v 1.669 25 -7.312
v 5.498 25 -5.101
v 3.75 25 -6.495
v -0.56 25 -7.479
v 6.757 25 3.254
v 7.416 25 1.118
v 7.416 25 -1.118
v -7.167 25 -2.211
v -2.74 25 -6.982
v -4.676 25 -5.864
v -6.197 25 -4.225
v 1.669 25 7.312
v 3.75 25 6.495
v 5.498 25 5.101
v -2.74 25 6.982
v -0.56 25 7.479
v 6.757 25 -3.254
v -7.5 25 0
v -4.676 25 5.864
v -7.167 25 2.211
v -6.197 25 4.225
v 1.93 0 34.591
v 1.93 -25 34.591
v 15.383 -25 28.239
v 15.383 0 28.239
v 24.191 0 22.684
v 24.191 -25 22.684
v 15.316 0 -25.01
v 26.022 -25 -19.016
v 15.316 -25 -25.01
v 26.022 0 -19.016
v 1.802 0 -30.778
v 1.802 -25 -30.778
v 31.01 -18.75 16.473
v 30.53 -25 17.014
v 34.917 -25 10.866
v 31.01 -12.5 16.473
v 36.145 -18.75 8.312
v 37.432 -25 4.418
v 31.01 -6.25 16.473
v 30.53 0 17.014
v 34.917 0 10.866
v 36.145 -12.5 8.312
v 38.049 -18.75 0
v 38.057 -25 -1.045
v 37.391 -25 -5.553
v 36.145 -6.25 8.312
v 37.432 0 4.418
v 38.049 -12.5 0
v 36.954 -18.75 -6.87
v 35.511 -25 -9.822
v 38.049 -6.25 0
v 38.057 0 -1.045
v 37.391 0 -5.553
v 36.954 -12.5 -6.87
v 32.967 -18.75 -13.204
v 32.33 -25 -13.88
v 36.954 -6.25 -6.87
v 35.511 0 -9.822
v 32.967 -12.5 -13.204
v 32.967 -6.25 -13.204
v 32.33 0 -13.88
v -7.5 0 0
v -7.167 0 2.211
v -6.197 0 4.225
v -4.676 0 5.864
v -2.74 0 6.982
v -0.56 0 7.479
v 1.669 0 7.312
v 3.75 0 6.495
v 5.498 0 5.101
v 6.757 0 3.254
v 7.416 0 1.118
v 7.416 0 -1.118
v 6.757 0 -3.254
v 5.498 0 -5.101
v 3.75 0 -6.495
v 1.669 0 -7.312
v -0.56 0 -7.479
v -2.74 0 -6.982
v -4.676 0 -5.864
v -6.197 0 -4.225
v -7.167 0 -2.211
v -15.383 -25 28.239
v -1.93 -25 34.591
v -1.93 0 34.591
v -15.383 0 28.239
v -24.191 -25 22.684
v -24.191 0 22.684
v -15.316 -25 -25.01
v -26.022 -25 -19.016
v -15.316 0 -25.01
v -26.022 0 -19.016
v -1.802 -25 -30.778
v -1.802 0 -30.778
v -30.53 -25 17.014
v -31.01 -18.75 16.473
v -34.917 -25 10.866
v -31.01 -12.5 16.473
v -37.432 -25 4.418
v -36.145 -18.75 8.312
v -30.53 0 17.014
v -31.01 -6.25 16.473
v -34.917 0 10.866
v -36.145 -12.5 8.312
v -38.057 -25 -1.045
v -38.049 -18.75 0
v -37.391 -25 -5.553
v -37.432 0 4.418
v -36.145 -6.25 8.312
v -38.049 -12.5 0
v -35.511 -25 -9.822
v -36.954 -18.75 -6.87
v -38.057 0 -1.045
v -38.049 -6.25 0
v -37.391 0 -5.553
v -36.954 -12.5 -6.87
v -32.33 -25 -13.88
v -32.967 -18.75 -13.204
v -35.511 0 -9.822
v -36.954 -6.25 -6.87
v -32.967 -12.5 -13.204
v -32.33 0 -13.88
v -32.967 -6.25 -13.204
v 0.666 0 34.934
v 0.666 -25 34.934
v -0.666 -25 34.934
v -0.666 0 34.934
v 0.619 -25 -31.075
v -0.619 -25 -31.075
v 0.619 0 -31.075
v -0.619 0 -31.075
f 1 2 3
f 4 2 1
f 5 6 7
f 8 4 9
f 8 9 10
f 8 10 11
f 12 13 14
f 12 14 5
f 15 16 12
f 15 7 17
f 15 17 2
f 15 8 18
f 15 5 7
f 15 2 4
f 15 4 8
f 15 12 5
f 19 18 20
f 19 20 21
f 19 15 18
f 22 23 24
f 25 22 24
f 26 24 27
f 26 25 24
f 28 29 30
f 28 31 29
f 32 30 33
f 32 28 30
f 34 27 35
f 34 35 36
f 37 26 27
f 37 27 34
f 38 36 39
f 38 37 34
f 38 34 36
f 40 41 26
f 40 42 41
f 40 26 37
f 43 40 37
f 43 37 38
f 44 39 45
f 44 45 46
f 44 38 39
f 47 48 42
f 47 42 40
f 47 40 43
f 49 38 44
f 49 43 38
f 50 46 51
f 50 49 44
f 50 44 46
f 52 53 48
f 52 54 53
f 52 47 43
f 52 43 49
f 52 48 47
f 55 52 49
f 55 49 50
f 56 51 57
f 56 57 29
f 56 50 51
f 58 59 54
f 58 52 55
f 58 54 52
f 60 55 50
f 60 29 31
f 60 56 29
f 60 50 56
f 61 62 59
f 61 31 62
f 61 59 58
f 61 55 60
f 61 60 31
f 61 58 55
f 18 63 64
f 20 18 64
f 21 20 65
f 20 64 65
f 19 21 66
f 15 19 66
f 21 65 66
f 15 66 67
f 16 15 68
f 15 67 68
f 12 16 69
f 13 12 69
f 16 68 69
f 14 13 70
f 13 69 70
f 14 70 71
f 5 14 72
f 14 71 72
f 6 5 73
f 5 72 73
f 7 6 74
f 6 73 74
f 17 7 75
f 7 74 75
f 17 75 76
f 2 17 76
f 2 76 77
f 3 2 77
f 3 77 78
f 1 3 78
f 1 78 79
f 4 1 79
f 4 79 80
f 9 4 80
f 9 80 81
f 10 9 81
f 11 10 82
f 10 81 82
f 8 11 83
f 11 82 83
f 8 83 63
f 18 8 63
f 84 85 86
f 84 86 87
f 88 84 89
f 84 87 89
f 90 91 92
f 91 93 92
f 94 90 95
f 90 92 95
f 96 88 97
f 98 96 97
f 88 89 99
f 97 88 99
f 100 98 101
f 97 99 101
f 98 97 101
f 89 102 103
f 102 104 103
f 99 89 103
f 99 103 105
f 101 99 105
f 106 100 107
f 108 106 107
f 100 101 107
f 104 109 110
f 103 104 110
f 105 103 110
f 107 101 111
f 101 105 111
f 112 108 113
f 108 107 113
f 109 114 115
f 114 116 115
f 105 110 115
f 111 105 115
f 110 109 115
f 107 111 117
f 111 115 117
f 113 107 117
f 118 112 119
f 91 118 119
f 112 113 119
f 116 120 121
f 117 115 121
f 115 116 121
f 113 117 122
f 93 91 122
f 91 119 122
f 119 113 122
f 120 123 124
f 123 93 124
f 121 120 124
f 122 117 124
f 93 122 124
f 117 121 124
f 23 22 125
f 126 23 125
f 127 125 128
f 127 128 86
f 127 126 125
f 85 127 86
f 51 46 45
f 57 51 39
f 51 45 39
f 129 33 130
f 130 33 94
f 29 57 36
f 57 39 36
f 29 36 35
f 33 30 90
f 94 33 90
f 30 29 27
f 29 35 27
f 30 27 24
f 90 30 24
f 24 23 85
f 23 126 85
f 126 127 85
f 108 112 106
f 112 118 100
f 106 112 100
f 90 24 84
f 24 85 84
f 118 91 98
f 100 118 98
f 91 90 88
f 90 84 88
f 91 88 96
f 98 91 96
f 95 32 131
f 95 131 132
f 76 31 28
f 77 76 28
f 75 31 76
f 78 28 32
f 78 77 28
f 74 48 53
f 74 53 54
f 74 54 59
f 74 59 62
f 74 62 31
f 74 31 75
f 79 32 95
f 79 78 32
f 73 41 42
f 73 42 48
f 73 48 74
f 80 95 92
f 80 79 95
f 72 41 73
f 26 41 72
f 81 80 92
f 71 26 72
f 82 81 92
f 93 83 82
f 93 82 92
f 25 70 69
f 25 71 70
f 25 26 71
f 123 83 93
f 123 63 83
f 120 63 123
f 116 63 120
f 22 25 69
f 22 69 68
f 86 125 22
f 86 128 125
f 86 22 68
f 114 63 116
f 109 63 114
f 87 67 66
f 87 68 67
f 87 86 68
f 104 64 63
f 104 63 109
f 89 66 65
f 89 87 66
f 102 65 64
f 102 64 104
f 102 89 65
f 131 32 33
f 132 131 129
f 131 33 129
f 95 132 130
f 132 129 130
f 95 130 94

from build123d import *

# Parameters (mm, degrees)
F1_DEPTH = 25
F2_R     = 7.5
F3_DEPTH = 25
F4_R     = 5


with BuildPart() as f1:
    # F0 (on Front) → F1 (new body)
    with BuildSketch(Plane.XZ):
        with BuildLine():
            add(Edge.make_bspline(
                [(0, 35.3876687586), (13.8926569286, 29.7244304014), (32.1401882045, 19.7182221568), (39.9630337201, 0.1220754807), (34.1200278266, -16.2486022664), (15.2266629868, -25.7030703609), (0, -31.4665324986)],
                knots=[0, 0, 0, 0, 0.2989563536, 0.5089024667, 0.6954830611, 1, 1, 1, 1], degree=3))
            add(Edge.make_bspline(
                [(0, 35.3876687586), (-13.8926569286, 29.7244304014), (-32.1401882045, 19.7182221568), (-39.9630337201, 0.1220754807), (-34.1200278266, -16.2486022664), (-15.2266629868, -25.7030703609), (0, -31.4665324986)],
                knots=[0, 0, 0, 0, 0.2989563536, 0.5089024667, 0.6954830611, 1, 1, 1, 1], degree=3))
        make_face()
    extrude(amount=F1_DEPTH)

    # F2 (on face) → F3 (join)
    with BuildSketch(Plane(origin=(0, 0, 0), x_dir=(-1, 0, 0), z_dir=(0, 1, 0))):
        Circle(F2_R)
    extrude(amount=F3_DEPTH)

    # F4
    f4_edges = [f1.edges().sort_by_distance(p)[0] for p in [
        (0, -12.5, 35.387669),
        (0, -12.5, -31.466532),
    ]]
    fillet(f4_edges, radius=F4_R)


solid = f1.part
